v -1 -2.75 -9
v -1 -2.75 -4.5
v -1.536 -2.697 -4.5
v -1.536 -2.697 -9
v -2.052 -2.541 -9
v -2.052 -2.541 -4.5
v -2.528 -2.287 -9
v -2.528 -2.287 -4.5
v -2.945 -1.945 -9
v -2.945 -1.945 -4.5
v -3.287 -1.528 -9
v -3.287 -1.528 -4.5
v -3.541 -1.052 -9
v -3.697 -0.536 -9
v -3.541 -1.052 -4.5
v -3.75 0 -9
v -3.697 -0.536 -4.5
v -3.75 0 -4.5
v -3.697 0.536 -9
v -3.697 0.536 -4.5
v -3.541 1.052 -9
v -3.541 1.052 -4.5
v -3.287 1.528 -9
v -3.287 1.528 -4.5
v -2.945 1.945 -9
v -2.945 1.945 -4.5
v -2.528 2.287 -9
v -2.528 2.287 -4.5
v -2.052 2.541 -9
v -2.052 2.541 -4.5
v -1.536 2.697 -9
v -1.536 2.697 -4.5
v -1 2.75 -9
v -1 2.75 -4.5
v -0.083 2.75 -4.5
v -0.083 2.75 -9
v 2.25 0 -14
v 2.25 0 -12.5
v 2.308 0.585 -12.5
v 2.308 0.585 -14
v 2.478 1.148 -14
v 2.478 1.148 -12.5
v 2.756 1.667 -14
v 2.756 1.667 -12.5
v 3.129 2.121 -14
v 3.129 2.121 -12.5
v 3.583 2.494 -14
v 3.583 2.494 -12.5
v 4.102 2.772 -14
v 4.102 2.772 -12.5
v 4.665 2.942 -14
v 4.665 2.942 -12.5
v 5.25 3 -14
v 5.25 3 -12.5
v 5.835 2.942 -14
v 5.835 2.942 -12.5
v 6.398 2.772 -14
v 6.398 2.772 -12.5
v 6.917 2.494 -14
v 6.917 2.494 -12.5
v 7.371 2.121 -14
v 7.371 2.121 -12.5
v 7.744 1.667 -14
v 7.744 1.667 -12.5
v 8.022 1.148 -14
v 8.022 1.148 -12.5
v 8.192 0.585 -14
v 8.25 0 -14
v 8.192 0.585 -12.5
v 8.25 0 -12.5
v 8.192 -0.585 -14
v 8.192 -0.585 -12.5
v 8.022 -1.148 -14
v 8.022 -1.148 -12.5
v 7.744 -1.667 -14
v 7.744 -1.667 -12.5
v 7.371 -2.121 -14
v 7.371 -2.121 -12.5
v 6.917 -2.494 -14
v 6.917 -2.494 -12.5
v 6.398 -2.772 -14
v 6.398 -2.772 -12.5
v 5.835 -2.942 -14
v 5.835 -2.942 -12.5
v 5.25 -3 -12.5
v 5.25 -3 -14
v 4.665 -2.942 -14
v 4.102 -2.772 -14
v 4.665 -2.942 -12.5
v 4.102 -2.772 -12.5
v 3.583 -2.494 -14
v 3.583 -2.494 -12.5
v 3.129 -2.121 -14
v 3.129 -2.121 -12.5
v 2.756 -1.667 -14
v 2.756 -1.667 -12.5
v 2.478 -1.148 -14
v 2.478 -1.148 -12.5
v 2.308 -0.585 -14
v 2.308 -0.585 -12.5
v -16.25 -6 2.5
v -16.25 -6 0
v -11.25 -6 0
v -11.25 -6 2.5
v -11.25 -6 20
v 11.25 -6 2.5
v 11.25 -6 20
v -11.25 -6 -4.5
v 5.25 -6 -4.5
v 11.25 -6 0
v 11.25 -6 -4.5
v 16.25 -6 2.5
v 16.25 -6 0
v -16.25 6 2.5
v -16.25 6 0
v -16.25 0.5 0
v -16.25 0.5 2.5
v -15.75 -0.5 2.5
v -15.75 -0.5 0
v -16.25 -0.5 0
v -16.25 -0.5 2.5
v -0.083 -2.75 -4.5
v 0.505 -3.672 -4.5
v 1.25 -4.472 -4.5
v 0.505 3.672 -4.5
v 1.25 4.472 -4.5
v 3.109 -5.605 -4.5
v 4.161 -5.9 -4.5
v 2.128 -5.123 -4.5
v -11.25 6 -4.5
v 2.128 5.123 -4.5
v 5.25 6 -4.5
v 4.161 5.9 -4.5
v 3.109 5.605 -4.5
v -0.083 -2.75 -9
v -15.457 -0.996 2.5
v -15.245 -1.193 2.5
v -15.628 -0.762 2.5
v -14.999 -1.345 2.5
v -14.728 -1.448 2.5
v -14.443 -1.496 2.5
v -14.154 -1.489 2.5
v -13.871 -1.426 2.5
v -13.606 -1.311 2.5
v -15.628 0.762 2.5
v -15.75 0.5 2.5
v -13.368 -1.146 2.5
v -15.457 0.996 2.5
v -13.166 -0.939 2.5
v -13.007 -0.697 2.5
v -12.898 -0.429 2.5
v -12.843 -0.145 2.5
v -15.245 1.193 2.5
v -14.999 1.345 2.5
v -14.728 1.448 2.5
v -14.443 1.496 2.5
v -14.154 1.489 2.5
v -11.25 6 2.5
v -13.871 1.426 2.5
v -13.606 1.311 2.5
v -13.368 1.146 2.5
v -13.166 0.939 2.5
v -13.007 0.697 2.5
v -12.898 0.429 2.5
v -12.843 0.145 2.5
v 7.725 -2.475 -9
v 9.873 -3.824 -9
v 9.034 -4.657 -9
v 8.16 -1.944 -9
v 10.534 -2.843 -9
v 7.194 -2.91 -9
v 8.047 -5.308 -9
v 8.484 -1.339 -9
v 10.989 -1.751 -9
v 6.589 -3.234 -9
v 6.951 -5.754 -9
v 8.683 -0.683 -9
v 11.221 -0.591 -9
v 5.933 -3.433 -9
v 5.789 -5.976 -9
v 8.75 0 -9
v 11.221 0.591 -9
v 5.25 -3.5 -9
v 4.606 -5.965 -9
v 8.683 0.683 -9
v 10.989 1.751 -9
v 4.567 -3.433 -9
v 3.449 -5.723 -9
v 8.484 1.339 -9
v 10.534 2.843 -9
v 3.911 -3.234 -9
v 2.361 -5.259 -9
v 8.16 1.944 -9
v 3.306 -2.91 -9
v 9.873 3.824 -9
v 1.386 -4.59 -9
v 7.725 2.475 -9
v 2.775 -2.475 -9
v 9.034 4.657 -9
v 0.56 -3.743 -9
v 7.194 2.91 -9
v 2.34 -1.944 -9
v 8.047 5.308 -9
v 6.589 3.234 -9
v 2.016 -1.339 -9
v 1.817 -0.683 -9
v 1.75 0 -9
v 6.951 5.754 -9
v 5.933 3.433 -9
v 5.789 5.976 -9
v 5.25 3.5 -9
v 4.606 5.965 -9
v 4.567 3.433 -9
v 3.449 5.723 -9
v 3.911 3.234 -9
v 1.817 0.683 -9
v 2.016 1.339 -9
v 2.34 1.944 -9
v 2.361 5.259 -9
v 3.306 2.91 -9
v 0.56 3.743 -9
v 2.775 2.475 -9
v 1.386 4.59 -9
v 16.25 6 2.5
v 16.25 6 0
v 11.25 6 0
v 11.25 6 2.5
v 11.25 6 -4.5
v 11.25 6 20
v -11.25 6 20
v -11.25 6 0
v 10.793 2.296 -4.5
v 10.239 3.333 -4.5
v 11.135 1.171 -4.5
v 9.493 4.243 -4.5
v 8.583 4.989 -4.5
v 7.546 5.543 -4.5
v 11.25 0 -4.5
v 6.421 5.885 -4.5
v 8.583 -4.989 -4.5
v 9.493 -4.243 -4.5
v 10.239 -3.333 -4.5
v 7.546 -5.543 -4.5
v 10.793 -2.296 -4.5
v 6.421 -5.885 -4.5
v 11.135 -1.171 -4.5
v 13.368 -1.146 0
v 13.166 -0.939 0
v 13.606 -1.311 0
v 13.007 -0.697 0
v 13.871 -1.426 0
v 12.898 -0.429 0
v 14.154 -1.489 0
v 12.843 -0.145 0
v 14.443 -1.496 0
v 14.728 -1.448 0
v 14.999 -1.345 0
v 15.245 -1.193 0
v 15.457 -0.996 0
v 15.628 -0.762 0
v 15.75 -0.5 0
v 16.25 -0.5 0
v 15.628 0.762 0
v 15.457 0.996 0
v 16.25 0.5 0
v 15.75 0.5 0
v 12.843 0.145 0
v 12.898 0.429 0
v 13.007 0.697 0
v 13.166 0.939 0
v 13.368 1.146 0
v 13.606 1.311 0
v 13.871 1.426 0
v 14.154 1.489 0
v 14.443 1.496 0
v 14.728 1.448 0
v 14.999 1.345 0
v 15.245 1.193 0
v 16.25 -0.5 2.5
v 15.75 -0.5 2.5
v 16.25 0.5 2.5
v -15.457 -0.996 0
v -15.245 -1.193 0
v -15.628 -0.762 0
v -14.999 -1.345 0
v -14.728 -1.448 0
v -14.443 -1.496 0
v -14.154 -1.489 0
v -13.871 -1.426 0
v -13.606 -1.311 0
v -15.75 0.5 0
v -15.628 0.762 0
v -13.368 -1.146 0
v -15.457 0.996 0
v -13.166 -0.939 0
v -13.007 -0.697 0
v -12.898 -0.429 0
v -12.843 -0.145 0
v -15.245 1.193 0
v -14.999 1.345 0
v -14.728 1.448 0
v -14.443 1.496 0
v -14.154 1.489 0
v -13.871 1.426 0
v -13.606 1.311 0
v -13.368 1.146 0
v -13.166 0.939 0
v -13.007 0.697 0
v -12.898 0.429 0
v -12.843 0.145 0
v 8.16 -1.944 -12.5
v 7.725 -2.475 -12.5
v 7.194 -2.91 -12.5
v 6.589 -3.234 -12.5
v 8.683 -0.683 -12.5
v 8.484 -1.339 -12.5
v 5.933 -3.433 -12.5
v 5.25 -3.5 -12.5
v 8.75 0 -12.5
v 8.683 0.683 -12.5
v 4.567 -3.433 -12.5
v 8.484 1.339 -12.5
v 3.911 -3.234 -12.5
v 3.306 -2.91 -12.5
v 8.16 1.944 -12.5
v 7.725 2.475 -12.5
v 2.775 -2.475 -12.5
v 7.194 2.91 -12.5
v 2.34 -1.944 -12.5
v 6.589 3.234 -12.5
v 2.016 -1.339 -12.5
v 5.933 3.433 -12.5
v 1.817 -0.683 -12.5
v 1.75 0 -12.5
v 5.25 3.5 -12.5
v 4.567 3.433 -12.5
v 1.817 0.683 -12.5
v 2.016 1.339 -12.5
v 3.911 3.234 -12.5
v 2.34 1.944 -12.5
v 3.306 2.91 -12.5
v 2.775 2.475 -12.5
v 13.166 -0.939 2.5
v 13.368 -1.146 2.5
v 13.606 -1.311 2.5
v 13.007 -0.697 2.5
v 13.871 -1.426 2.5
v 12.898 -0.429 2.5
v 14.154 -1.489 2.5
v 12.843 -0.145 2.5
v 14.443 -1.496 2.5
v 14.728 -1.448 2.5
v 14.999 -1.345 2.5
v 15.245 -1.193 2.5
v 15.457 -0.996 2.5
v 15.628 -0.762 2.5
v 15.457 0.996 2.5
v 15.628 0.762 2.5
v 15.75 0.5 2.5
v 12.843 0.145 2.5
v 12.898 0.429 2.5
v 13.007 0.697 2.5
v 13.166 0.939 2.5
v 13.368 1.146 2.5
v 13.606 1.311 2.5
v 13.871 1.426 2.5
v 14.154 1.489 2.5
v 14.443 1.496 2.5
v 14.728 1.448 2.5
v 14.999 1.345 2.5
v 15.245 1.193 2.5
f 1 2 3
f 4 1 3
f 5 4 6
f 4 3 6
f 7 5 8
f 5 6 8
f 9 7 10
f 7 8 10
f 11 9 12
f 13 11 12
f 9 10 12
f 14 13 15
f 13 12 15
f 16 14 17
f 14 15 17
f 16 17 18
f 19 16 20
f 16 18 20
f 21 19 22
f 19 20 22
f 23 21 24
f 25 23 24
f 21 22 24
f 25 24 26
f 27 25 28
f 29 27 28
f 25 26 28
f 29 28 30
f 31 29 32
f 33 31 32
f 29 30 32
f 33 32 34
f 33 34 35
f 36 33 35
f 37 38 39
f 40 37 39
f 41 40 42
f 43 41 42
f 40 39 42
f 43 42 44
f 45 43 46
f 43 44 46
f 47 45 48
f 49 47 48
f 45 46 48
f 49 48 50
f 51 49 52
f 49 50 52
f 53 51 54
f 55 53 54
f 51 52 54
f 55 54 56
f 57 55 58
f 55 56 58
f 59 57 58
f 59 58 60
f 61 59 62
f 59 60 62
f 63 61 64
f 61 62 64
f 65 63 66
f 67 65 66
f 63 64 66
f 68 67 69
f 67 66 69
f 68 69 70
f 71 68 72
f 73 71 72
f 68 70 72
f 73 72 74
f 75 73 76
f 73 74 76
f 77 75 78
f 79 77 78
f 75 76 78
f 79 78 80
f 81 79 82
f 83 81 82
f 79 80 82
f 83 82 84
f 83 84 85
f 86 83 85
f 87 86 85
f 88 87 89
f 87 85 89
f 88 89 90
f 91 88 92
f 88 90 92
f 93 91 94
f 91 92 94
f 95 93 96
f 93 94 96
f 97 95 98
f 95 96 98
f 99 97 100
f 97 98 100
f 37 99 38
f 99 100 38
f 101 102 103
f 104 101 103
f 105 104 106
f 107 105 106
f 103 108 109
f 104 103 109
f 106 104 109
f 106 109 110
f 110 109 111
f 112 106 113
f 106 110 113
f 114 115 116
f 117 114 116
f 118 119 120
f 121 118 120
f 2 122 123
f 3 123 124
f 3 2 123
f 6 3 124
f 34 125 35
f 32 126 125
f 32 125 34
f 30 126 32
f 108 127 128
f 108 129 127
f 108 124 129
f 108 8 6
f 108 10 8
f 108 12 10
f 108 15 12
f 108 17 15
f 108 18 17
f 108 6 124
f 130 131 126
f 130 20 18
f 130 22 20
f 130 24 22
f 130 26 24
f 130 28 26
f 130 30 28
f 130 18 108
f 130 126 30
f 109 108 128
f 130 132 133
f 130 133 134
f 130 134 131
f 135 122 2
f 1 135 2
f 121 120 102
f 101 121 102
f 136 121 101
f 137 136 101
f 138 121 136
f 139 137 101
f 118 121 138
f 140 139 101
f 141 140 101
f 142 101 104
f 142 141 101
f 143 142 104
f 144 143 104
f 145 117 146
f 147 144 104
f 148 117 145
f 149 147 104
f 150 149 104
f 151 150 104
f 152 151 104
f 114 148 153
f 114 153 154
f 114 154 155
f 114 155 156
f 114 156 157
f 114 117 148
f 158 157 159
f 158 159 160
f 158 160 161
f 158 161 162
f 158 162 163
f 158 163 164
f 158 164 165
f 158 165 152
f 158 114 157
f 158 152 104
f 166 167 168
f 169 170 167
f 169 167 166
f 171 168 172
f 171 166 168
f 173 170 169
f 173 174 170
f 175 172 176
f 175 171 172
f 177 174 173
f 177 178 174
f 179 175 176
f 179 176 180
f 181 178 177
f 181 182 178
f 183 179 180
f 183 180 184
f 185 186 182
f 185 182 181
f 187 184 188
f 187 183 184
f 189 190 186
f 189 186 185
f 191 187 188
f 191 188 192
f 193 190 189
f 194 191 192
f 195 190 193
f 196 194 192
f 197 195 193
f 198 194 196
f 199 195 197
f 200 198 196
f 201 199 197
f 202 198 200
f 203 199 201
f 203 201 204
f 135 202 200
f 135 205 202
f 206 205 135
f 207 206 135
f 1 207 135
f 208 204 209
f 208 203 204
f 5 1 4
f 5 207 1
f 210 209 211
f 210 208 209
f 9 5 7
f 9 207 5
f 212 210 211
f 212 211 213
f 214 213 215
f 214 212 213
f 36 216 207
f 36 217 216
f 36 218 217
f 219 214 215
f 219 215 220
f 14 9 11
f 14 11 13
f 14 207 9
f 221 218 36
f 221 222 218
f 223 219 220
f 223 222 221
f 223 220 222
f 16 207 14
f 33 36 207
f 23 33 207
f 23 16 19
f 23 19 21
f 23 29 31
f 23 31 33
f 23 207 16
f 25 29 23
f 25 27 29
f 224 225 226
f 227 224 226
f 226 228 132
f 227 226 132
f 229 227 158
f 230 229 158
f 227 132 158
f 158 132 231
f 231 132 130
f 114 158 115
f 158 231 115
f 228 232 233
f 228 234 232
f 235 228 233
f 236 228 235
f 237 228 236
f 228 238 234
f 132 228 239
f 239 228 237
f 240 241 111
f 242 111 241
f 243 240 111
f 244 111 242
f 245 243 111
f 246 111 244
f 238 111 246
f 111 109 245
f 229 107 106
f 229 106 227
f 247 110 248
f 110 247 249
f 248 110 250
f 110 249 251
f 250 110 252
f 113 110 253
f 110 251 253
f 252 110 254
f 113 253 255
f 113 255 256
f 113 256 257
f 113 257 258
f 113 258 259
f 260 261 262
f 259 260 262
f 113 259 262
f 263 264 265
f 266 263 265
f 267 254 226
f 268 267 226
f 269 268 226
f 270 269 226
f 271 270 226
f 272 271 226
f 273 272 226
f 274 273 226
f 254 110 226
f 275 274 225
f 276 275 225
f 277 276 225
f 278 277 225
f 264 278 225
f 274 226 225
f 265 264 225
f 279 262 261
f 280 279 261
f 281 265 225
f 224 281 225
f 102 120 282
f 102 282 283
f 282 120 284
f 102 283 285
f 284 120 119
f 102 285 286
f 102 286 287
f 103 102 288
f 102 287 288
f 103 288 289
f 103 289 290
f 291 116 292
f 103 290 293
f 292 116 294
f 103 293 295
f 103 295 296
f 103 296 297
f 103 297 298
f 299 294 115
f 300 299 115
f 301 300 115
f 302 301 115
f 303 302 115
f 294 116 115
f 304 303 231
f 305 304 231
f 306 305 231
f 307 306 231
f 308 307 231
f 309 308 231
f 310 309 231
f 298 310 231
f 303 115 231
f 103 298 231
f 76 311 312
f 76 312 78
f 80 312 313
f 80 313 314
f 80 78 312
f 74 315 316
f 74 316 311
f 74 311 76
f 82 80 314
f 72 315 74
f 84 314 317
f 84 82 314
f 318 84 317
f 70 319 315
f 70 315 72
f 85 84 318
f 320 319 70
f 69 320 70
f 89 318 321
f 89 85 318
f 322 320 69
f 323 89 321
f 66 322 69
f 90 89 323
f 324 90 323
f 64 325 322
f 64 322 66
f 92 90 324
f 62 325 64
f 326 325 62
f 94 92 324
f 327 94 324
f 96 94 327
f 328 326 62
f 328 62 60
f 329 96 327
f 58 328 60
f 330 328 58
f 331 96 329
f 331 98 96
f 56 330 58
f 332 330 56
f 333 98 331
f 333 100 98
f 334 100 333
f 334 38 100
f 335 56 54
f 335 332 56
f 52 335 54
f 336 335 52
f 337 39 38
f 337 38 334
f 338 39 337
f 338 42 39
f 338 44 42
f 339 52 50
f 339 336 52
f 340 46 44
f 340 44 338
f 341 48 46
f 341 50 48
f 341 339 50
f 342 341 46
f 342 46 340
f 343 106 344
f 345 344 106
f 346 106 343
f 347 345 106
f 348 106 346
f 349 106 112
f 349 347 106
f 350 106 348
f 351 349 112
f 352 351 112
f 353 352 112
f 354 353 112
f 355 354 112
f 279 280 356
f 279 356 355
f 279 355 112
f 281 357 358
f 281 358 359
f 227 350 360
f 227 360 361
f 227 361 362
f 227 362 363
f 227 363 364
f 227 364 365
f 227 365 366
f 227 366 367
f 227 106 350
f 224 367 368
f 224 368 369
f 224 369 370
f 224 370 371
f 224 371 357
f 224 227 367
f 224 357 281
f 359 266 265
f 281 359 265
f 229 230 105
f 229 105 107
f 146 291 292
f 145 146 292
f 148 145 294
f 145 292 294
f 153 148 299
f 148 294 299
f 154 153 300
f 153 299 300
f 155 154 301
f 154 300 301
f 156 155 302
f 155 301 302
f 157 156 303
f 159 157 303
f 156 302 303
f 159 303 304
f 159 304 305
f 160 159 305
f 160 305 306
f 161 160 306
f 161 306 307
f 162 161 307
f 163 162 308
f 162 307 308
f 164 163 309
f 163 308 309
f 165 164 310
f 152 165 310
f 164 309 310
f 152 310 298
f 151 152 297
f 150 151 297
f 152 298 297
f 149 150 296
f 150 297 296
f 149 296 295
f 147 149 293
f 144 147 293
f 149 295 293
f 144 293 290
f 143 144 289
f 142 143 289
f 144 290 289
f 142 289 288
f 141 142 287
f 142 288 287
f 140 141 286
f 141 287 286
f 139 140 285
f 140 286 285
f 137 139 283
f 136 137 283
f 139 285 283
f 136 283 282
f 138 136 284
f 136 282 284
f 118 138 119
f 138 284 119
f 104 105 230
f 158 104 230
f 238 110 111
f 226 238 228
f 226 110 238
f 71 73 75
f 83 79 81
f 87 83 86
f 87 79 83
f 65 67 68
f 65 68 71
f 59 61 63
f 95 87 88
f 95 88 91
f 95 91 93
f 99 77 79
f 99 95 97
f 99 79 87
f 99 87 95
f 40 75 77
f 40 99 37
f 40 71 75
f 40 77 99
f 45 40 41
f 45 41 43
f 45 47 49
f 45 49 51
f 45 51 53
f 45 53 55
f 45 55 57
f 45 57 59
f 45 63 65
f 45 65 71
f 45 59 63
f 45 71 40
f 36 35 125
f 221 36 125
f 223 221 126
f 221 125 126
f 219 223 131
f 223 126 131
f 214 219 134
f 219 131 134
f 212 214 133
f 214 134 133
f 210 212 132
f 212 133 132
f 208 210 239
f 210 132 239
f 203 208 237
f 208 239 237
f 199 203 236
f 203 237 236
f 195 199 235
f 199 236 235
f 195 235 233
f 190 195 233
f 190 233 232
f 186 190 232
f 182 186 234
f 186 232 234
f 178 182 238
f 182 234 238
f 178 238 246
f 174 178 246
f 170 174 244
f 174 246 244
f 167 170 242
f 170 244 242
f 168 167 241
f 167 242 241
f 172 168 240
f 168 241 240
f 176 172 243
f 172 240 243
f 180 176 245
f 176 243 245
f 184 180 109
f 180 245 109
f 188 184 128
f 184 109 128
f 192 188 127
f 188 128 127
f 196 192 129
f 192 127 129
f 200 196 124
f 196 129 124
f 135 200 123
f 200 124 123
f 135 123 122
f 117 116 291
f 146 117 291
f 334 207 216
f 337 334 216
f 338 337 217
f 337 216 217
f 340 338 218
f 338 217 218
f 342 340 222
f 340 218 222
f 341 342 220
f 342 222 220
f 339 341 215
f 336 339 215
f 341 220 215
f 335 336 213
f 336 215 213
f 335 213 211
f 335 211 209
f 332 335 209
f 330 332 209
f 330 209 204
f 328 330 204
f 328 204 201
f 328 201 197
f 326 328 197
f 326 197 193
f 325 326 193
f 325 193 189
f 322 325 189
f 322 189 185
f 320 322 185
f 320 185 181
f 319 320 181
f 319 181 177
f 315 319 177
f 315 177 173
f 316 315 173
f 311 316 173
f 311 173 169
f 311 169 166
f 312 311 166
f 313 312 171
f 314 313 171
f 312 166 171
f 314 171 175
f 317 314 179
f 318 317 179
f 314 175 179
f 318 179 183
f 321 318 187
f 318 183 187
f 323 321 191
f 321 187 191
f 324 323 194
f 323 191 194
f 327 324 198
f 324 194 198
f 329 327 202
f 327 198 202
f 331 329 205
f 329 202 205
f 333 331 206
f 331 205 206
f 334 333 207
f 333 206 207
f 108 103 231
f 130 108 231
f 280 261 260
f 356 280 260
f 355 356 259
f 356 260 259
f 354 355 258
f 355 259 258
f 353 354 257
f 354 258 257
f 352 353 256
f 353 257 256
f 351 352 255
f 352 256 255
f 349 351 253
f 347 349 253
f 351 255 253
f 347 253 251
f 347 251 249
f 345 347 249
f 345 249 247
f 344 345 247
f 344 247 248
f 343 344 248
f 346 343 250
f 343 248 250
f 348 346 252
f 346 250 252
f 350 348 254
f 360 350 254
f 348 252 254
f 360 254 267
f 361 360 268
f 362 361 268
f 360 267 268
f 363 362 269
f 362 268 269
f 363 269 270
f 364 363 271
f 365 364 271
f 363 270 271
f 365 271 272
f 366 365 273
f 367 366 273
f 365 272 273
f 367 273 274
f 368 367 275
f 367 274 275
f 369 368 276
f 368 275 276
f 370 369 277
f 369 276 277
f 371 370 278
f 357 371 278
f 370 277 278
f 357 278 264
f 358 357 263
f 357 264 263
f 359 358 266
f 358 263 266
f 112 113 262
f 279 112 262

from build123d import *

# Parameters (mm, degrees)
BOSS_EXTRUDE1_DEPTH = 2.5
SKETCH3_W           = 22.5
SKETCH3_H           = 12
BOSS_EXTRUDE2_DEPTH = 17.5
SKETCH4_W           = 22.5
SKETCH4_H           = 12
BOSS_EXTRUDE3_DEPTH = 4.5
BOSS_EXTRUDE4_DEPTH = 4.5
SKETCH6_R           = 3.5
BOSS_EXTRUDE5_DEPTH = 5
CUT_EXTRUDE1_START  = -1.5
SKETCH7_R           = 3.5
SKETCH7_R_2         = 3
CUT_EXTRUDE1_DEPTH  = 1.5


with BuildPart() as part:
    # Sketch2 → Boss-Extrude1 (new body)
    with BuildSketch(Plane.XY):
        with BuildLine():
            Line((-16.25, -6), (0, -6))
            Line((0, -6), (16.25, -6))
            Line((16.25, -6), (16.25, -0.5))
            Line((16.25, -0.5), (15.75, -0.5))
            ThreePointArc((15.75, -0.5), (12.835786438, 0), (15.75, 0.5))
            Line((15.75, 0.5), (16.25, 0.5))
            Line((16.25, 0.5), (16.25, 6))
            Line((16.25, 6), (0, 6))
            Line((0, 6), (-16.25, 6))
            Line((-16.25, 6), (-16.25, 0.5))
            Line((-16.25, 0.5), (-15.75, 0.5))
            ThreePointArc((-15.75, 0.5), (-12.835786438, 0), (-15.75, -0.5))
            Line((-15.75, -0.5), (-16.25, -0.5))
            Line((-16.25, -0.5), (-16.25, -6))
        make_face()
    extrude(amount=BOSS_EXTRUDE1_DEPTH)

    # Sketch3 → Boss-Extrude2 (add)
    with BuildSketch(Plane.XY.offset(2.5)):
        Rectangle(SKETCH3_W, SKETCH3_H)
    extrude(amount=BOSS_EXTRUDE2_DEPTH)

    # Sketch4 → Boss-Extrude3 (add)
    with BuildSketch(Plane(origin=(0, 0, 0), x_dir=(-1, 0, 0), z_dir=(0, 0, -1))):
        Rectangle(SKETCH4_W, SKETCH4_H)
    extrude(amount=BOSS_EXTRUDE3_DEPTH)

    # Sketch5 → Boss-Extrude4 (add)
    with BuildSketch(Plane(origin=(0, 0, -4.5), x_dir=(-1, 0, 0), z_dir=(0, 0, -1))):
        with BuildLine():
            Line((1, 2.75), (0.082682252, 2.75))
            ThreePointArc((0.082682252, 2.75), (-11.25, 0), (0.082682252, -2.75))
            Line((0.082682252, -2.75), (1, -2.75))
            ThreePointArc((1, -2.75), (3.75, 0), (1, 2.75))
        make_face()
    extrude(amount=BOSS_EXTRUDE4_DEPTH)

    # Sketch6 → Boss-Extrude5 (add)
    with BuildSketch(Plane(origin=(0, 0, -9), x_dir=(-1, 0, 0), z_dir=(0, 0, -1))):
        with Locations((-5.25, 0)):
            Circle(SKETCH6_R)
    extrude(amount=BOSS_EXTRUDE5_DEPTH)

    # Sketch7 → Cut-Extrude1 (cut)
    with BuildSketch(Plane(origin=(0, 0, -14), x_dir=(-1, 0, 0), z_dir=(0, 0, -1)).offset(CUT_EXTRUDE1_START)):
        with Locations((-5.25, 0)):
            Circle(SKETCH7_R)
        with Locations((-5.25, 0)):
            Circle(SKETCH7_R_2, mode=Mode.SUBTRACT)
    extrude(amount=CUT_EXTRUDE1_DEPTH, mode=Mode.SUBTRACT)


solid = part.part
